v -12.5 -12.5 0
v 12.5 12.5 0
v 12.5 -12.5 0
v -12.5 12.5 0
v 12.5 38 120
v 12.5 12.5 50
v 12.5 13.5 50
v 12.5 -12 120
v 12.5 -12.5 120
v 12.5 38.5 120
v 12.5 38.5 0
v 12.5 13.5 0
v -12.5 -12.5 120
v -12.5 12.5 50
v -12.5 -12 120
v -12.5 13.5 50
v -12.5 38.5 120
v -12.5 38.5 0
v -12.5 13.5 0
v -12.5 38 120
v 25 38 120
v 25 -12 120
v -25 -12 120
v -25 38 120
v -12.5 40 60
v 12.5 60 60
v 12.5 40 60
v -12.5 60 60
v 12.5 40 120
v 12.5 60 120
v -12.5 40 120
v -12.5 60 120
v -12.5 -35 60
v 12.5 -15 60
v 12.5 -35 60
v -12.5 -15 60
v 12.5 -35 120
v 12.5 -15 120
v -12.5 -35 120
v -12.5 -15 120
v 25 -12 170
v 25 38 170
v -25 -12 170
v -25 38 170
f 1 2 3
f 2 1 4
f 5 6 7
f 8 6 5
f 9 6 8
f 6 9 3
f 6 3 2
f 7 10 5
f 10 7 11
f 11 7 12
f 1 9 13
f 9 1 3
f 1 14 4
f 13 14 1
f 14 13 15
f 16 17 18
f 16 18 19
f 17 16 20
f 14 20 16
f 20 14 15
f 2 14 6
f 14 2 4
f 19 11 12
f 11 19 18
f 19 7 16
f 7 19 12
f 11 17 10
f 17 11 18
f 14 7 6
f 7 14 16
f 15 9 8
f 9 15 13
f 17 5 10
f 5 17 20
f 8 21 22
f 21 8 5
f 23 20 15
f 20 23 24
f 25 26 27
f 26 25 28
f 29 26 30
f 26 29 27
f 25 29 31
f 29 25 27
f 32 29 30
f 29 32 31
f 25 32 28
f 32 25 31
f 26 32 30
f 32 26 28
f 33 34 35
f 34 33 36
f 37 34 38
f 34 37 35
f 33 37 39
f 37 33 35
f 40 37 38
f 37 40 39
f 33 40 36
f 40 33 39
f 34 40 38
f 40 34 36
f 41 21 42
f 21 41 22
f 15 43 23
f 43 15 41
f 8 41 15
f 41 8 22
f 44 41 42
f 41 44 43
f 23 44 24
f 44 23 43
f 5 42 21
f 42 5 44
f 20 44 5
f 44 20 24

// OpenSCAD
union()
{
    M19();
    translate([0.0, 26.0, 0.0])
    {
        M19();
    }
    translate([0.0, 0.0, 50.0])
    {
        translate([0.0, 13.0, 0.0])
        {
            M23();
        }
    }
    translate([0.0, 0.0, 60.0])
    {
        translate([0.0, 50.0, 0.0])
        {
            M28();
        }
    }
    translate([0.0, 0.0, 60.0])
    {
        translate([0.0, -25.0, 0.0])
        {
            M28();
        }
    }
    translate([0.0, 0.0, 120.0])
    {
        translate([0.0, 13.0, 0.0])
        {
            M32();
        }
    }
}

module M32()
{
    linear_extrude(height = 50.0, twist = 0.0, scale = 1.0, slices = 1, center = false)
    {
        M30();
    }
}

module M19()
{
    linear_extrude(height = 70.0, twist = 0.0, scale = 1.0, slices = 1, center = false)
    {
        M13();
    }
}

module M23()
{
    linear_extrude(height = 70.0, twist = 0.0, scale = 1.0, slices = 1, center = false)
    {
        M21();
    }
}

module M28()
{
    linear_extrude(height = 60.0, twist = 0.0, scale = 1.0, slices = 1, center = false)
    {
        M25();
    }
}

module M21()
{
    scale([25.0, 51.0])
    {
        M8();
    }
}

module M25()
{
    scale([25.0, 20.0])
    {
        M8();
    }
}

module M13()
{
    scale([25.0, 25.0])
    {
        M8();
    }
}

module M30()
{
    scale([50.0, 50.0])
    {
        M8();
    }
}

module M8()
{
    polygon
    (
        points =
        [
            [-0.5, -0.5], 
            [0.5, -0.5], 
            [0.5, 0.5], 
            [-0.5, 0.5]
        ],
        paths =
        [
            [0, 1, 2, 3]
        ]
    );
}
